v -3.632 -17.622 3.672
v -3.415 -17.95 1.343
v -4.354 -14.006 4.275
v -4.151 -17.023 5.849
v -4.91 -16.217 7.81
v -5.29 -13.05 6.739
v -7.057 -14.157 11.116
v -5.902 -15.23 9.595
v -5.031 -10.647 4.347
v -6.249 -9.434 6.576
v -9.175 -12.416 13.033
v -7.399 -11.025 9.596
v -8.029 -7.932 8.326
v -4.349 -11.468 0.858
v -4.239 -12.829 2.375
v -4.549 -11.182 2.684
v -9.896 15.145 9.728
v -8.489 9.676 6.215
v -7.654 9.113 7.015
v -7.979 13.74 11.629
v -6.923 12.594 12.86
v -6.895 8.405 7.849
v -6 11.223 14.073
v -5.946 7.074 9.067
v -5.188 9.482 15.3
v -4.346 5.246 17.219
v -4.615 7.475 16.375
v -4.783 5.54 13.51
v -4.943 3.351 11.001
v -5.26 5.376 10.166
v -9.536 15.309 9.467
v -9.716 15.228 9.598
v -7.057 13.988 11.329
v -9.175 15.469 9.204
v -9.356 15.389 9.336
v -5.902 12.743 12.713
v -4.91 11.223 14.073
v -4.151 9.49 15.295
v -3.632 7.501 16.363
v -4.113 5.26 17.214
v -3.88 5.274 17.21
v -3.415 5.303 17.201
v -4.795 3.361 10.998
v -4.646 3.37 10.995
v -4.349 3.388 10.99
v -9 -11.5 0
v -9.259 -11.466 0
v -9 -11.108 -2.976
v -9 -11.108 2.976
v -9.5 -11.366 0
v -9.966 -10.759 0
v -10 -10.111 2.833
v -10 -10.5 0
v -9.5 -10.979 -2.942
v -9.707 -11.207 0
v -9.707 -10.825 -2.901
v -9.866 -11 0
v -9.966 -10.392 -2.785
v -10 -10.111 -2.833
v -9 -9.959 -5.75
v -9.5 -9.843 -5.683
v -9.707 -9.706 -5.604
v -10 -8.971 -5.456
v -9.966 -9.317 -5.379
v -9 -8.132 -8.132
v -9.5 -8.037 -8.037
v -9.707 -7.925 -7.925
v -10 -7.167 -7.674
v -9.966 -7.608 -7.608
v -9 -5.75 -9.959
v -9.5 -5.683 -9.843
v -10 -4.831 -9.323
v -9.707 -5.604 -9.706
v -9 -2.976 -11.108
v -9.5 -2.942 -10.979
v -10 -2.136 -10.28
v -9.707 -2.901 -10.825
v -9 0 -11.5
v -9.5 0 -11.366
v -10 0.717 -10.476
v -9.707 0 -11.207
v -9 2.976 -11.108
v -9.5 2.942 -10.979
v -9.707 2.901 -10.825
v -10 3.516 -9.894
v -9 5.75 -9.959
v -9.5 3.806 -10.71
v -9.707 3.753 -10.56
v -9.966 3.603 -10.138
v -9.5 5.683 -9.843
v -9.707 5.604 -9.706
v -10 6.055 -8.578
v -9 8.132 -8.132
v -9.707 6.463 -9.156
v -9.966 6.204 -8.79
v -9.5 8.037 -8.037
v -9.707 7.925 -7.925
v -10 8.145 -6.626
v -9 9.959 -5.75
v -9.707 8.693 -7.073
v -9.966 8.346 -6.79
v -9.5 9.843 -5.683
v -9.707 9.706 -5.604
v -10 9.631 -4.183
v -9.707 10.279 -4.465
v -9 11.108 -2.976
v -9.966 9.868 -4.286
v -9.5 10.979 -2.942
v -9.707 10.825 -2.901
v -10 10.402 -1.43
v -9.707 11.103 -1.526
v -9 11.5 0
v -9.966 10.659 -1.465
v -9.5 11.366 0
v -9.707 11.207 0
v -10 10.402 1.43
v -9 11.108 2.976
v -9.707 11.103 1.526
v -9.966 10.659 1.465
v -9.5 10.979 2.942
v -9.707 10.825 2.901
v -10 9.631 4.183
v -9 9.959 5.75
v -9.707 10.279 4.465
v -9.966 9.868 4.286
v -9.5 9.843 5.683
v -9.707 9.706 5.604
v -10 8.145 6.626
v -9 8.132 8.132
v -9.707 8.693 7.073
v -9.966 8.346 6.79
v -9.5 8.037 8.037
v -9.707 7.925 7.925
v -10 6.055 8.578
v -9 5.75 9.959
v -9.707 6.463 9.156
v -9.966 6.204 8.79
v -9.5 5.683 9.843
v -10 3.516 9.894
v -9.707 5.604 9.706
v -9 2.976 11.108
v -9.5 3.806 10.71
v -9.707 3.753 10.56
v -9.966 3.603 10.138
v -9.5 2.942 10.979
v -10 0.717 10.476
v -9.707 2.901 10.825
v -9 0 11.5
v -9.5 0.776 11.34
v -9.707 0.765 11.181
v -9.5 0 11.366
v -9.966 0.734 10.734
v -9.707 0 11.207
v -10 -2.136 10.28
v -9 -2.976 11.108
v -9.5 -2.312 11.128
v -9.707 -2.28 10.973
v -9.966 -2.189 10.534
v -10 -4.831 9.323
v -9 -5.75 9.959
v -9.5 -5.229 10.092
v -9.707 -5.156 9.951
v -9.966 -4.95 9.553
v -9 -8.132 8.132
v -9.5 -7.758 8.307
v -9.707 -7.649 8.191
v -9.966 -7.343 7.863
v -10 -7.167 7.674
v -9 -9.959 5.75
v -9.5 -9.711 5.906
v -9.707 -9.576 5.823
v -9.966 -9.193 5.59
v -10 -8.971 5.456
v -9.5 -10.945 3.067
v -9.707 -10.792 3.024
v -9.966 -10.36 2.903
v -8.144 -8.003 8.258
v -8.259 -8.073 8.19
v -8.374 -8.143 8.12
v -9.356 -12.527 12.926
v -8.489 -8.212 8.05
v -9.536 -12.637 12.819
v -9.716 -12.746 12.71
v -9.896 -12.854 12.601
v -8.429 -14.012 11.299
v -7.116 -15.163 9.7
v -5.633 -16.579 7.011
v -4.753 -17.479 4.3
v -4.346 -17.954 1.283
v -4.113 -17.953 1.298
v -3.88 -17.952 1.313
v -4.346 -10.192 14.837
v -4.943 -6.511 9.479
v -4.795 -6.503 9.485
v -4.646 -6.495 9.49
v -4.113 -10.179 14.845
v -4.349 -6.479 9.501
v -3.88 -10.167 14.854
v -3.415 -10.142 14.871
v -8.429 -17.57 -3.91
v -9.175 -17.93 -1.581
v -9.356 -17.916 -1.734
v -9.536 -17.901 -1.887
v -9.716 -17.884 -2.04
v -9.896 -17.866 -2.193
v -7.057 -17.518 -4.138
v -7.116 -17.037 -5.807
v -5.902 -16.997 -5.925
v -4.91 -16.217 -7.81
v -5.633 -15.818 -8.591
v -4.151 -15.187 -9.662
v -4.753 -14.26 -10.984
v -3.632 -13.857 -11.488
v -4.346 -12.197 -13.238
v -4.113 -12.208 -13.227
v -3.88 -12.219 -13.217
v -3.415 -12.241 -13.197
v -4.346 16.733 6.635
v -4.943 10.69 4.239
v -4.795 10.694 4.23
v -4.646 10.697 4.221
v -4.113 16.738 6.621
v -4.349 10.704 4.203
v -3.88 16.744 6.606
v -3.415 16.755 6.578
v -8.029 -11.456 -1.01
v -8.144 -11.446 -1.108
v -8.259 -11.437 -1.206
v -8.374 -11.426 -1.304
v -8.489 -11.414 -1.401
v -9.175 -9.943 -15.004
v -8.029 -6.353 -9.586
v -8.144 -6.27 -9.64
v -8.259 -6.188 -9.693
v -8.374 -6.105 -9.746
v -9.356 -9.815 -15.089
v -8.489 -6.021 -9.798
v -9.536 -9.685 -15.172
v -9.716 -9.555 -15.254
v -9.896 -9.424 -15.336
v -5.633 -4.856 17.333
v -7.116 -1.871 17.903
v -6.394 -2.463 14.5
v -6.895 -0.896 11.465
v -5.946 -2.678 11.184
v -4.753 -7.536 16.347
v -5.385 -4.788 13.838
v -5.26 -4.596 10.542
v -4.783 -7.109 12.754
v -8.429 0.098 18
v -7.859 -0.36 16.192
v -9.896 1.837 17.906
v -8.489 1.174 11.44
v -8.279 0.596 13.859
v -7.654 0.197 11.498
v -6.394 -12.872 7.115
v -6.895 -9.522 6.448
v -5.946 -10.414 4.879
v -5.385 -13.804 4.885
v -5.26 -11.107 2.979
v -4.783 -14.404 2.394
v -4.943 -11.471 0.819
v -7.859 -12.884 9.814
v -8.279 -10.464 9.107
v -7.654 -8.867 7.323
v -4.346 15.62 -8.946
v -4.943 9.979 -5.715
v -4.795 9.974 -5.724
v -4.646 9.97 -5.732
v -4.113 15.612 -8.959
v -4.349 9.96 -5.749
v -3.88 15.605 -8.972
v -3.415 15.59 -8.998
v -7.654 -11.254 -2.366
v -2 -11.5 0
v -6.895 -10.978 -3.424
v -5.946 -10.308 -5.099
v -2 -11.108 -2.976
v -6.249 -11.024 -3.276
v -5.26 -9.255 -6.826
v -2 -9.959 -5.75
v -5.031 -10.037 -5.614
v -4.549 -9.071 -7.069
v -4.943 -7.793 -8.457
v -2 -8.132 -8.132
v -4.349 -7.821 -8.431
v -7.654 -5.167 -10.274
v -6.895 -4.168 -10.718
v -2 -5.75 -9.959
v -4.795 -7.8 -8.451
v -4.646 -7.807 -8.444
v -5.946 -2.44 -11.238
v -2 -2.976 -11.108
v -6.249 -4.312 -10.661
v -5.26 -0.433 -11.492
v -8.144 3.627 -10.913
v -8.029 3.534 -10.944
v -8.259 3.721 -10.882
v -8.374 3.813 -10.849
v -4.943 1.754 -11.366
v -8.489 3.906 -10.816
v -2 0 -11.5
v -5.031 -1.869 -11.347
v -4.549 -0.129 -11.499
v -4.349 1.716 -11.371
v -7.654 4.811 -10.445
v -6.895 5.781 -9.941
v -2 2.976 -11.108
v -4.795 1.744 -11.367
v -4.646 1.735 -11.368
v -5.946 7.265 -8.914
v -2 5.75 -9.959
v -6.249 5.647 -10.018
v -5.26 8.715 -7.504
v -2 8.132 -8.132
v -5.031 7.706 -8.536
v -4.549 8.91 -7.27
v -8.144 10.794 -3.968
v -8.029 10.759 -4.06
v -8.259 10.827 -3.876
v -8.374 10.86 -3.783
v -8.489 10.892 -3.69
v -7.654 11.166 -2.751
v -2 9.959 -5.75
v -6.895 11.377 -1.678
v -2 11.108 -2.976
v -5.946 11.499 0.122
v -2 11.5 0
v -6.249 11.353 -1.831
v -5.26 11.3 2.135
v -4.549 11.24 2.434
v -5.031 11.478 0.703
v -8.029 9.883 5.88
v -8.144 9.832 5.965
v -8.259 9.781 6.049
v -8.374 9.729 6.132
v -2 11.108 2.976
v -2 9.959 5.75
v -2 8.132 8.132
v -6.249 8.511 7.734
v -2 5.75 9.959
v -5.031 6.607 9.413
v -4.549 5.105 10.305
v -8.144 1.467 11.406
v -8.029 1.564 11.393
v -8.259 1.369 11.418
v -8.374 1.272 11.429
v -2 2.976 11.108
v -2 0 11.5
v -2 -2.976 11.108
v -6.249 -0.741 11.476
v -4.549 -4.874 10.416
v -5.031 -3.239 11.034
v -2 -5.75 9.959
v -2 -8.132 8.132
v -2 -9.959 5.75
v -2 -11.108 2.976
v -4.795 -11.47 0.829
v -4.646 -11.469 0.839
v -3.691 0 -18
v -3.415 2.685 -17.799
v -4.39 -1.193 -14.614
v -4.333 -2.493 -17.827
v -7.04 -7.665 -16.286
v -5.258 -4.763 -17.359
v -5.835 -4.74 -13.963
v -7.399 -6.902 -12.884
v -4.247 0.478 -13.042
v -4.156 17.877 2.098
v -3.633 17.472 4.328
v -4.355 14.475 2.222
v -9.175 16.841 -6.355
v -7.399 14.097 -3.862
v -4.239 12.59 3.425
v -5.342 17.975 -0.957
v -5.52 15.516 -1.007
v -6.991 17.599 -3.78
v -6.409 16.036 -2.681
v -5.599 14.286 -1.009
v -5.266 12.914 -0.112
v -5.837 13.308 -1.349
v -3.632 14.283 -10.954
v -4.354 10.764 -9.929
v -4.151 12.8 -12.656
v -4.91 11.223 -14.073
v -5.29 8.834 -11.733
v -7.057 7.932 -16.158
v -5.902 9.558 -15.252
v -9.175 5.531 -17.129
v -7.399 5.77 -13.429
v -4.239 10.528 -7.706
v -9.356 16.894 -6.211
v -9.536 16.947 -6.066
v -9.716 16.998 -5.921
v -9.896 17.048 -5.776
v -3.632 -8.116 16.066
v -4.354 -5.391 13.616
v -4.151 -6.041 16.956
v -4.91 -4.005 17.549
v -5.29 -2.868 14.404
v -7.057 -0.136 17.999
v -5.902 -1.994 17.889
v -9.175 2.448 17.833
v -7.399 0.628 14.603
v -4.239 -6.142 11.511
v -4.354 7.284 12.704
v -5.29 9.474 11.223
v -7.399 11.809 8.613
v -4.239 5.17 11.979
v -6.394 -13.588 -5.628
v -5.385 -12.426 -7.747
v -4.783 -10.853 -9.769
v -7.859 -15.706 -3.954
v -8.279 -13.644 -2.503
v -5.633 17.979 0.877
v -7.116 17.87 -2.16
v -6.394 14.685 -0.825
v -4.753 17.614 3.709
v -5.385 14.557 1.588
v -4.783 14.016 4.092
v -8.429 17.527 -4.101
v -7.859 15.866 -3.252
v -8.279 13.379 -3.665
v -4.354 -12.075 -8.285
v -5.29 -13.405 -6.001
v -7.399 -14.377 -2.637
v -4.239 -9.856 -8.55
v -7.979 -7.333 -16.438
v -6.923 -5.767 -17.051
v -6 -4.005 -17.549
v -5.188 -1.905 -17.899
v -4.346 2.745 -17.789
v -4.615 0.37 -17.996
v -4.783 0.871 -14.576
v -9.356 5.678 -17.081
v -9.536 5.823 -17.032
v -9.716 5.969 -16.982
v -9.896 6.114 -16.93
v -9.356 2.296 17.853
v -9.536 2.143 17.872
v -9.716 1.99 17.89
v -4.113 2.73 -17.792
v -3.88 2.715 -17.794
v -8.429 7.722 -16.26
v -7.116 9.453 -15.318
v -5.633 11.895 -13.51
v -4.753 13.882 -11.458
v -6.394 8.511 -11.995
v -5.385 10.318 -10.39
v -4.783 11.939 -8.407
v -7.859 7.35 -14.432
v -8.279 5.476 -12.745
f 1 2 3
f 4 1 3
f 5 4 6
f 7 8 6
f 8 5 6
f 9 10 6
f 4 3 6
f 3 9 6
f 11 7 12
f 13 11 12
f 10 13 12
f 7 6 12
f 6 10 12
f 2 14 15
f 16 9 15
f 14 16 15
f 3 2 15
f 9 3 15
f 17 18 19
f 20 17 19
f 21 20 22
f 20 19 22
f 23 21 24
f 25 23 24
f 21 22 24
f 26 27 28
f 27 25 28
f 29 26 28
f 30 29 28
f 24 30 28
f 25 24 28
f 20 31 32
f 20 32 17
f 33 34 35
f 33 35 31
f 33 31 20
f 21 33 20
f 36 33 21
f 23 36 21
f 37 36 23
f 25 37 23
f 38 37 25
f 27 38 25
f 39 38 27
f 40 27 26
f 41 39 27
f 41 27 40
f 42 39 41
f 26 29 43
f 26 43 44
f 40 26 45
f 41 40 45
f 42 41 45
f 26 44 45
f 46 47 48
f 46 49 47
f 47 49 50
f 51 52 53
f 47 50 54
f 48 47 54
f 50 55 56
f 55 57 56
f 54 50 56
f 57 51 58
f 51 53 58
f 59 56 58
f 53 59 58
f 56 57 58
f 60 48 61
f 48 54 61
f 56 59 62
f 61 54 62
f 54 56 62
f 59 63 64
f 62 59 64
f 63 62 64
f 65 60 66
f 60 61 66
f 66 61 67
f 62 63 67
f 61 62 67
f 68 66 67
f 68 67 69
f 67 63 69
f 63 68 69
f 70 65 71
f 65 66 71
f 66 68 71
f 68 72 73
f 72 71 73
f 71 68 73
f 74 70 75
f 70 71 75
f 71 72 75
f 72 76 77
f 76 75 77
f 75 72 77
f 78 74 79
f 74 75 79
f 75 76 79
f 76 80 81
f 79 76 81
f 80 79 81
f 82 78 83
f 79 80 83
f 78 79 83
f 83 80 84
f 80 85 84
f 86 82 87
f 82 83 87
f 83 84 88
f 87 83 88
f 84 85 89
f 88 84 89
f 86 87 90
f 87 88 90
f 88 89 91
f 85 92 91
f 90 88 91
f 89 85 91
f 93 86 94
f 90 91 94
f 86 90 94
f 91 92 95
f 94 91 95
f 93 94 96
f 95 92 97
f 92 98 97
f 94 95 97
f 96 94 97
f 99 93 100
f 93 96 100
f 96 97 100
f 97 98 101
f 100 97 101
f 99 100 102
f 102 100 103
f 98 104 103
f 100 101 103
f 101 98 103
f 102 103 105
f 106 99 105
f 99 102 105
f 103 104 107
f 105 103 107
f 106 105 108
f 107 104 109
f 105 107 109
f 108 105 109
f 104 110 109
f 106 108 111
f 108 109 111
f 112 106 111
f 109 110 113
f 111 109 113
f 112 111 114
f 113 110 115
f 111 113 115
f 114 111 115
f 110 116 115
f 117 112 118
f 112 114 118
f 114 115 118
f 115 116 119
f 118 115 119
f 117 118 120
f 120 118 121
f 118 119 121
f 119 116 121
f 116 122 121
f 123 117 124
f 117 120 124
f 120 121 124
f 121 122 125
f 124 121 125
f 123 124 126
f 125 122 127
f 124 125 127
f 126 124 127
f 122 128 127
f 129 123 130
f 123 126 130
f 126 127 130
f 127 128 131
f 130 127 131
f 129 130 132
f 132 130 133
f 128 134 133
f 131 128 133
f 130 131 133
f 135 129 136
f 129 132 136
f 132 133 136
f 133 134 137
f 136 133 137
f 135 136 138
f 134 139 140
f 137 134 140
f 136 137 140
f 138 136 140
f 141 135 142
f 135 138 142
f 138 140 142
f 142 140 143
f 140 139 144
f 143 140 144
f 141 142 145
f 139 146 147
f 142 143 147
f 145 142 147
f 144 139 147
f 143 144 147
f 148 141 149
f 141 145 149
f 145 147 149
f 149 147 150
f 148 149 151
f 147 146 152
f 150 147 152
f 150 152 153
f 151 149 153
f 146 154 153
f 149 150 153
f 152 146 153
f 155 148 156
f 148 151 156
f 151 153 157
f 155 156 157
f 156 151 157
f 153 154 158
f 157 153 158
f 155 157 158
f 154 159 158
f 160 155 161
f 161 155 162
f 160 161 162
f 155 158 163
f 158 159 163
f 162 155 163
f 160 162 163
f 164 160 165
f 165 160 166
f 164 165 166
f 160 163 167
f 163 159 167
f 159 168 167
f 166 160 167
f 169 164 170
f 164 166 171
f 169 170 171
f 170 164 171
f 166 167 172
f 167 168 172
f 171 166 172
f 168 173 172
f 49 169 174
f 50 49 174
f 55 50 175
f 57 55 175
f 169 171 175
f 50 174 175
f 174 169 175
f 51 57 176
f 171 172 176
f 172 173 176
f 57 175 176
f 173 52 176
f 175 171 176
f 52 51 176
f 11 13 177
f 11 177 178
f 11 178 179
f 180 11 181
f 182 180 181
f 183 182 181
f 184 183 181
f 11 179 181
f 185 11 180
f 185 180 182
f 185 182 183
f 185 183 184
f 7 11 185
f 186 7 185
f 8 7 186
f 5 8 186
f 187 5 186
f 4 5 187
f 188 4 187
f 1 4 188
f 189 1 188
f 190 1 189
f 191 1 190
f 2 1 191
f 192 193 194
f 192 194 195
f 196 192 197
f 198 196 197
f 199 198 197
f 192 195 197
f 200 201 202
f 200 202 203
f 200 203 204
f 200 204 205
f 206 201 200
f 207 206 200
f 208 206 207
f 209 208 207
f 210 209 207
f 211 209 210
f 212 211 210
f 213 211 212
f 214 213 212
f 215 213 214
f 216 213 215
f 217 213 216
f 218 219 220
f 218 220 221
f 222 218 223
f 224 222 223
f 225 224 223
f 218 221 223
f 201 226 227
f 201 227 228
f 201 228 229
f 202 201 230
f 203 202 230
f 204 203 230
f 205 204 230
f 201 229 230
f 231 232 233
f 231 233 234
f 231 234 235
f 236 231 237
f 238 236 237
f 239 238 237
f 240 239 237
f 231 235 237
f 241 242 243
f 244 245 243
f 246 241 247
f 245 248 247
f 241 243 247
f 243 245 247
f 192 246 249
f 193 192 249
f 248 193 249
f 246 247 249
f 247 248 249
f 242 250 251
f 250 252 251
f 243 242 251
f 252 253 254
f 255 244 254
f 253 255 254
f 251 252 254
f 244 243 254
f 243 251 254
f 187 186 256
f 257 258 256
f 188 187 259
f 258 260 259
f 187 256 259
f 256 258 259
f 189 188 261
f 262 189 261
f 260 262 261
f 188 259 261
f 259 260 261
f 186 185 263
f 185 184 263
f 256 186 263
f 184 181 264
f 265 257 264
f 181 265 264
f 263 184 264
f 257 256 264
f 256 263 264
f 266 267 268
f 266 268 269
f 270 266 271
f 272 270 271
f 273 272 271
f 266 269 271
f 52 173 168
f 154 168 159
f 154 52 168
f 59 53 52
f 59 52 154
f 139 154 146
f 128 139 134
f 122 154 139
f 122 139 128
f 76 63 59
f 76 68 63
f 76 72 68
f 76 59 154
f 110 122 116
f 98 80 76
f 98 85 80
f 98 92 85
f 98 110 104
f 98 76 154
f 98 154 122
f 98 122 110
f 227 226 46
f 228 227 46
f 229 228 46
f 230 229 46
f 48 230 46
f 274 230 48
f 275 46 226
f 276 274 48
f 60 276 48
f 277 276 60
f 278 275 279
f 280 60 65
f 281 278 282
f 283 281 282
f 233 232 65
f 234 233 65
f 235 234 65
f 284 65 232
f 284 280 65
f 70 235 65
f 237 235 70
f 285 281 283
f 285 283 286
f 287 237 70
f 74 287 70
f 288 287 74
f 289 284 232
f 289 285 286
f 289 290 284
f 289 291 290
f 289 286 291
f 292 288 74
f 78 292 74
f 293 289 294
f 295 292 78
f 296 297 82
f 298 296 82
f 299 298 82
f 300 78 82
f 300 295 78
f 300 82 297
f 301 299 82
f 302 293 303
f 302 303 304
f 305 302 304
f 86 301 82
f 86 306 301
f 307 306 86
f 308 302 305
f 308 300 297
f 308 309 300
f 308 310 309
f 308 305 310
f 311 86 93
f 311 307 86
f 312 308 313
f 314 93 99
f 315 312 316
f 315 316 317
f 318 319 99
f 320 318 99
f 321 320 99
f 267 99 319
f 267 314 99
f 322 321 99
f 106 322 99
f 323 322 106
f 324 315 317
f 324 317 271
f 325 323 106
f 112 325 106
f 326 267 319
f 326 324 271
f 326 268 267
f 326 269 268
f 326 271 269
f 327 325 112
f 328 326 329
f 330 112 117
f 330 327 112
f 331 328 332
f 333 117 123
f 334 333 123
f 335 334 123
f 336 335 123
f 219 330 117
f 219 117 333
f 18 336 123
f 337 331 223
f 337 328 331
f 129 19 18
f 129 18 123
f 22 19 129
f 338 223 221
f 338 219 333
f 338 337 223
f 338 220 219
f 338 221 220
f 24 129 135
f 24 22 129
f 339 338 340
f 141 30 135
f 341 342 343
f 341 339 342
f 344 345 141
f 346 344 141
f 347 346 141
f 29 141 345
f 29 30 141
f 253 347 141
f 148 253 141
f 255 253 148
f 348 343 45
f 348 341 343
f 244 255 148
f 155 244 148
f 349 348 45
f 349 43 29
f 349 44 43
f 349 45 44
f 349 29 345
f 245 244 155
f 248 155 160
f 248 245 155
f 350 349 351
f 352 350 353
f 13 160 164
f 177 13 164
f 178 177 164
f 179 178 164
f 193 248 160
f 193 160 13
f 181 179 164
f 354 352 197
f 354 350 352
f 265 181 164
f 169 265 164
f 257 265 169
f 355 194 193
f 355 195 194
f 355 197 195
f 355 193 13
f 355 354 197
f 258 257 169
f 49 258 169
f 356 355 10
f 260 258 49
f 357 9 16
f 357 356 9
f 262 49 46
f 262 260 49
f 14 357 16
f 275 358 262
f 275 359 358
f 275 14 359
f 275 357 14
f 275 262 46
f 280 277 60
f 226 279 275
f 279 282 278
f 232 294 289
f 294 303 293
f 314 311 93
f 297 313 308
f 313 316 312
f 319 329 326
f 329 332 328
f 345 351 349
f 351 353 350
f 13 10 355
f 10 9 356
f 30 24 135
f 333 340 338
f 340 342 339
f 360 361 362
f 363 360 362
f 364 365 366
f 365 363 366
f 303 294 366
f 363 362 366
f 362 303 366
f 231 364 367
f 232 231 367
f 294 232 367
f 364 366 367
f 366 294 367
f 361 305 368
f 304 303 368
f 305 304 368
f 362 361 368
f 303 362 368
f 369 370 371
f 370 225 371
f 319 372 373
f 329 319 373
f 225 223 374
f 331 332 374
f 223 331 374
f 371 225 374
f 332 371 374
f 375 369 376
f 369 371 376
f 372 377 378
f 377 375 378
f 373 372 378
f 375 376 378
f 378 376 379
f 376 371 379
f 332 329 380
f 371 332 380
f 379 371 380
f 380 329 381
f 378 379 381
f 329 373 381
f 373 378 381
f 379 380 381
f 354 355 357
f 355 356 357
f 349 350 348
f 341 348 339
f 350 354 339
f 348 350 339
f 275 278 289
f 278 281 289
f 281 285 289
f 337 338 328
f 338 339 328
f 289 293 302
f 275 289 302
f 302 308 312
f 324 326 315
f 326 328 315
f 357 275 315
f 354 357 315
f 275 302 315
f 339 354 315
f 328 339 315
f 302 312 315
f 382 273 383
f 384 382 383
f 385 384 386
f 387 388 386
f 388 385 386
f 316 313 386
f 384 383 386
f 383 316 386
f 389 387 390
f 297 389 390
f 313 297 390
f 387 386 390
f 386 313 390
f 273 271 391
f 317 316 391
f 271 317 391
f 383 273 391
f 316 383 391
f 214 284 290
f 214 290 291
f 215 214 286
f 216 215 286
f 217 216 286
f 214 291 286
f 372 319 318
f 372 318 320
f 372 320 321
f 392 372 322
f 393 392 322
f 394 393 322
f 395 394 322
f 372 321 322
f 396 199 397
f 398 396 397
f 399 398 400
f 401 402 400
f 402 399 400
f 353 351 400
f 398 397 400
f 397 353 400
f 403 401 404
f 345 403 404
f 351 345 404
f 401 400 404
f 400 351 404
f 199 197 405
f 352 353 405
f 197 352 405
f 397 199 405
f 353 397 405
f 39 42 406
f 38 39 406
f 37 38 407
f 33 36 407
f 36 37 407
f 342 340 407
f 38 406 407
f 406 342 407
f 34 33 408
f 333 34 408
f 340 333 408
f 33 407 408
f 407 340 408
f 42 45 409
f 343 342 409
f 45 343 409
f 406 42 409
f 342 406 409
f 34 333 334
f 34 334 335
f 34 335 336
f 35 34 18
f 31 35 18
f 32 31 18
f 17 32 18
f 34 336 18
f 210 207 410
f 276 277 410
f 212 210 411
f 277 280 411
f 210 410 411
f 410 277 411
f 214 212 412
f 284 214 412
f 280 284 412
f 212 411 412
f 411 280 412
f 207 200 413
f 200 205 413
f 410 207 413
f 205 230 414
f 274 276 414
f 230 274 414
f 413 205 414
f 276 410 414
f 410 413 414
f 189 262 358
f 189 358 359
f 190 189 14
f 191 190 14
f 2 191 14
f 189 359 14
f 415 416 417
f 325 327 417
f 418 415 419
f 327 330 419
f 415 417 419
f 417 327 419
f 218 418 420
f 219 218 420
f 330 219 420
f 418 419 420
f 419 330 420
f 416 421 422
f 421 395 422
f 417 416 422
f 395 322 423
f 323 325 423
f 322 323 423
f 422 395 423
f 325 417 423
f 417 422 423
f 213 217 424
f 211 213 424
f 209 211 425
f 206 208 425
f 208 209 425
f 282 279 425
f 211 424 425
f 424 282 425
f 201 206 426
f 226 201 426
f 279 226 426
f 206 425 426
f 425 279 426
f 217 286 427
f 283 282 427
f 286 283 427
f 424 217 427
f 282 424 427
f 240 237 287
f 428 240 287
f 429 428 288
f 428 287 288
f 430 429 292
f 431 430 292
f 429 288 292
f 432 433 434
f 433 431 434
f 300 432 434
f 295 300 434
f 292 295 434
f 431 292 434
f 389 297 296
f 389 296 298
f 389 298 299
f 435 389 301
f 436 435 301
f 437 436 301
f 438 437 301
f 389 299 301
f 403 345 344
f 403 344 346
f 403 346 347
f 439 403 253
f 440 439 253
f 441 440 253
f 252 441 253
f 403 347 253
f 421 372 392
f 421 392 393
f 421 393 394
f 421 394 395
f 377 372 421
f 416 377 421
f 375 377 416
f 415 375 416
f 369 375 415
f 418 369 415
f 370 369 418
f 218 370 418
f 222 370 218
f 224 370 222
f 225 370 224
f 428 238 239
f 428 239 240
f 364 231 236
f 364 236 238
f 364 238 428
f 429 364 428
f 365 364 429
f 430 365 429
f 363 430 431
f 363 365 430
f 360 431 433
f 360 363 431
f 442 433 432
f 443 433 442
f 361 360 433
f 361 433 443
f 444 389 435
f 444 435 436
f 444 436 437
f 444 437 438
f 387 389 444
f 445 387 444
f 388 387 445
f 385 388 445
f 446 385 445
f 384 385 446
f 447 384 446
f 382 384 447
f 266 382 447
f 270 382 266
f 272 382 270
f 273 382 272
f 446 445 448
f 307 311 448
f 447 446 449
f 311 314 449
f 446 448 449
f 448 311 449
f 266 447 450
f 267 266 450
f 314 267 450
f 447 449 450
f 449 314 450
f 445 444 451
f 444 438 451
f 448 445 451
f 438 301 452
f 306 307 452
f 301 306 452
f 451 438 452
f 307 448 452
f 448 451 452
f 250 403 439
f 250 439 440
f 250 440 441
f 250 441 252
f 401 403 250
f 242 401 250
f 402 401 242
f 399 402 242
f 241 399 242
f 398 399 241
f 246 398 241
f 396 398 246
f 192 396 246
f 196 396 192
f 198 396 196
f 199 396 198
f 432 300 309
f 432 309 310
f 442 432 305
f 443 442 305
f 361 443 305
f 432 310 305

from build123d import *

# Parameters (mm, degrees)
SKETCH5_W                  = 8
SKETCH5_H                  = 11.5
CIRPATTERN1_COUNT          = 7
SKETCH_CUT_BLADE_OUTSIDE_W = 50.999
SKETCH_CUT_BLADE_OUTSIDE_H = 50.116
SKETCH_CUT_BLADE_OUTSIDE_R = 18
CUT_FAN_BLADE_DEPTH        = 30.009117079
COSMETIC_FILLET_R          = 1


with BuildPart() as part:
    # Sketch5 → Body (revolve)
    with BuildSketch(Plane.XY, mode=Mode.PRIVATE) as body_sk:
        with Locations((-6, 5.75)):
            Rectangle(SKETCH5_W, SKETCH5_H)
    revolve(body_sk.sketch.rotate(Axis((-10, 0, 0), (1, 0, 0)), 180), axis=Axis((-10, 0, 0), (1, 0, 0)))

    # Sketch-Blade-Top → Loft-Fan-Blade section 0
    with BuildSketch(Plane(origin=(0, 18, 0), x_dir=(-1, 0, 0), z_dir=(0, 1, 0)), mode=Mode.PRIVATE) as loft_fan_blade_s0:
        with BuildLine():
            Line((4.220534784, 7.137045162), (3.222970733, 7.067288688))
            ThreePointArc((3.222970733, 7.067288688), (5.086454542, -0.406736643), (9.393823742, -6.792674095))
            Line((9.393823742, -6.792674095), (10.113163542, -6.098015725))
            ThreePointArc((10.113163542, -6.098015725), (6, 0), (4.220534784, 7.137045162))
        make_face()
    loft_fan_blade = loft([loft_fan_blade_s0.sketch, Vertex(-6, 0, 0)])

    # CirPattern1: Loft-Fan-Blade ×7 about axis
    cirpattern1_axis = Axis((-10, 0, 0), (1, 0, 0))
    for i in range(1, CIRPATTERN1_COUNT):
        add(loft_fan_blade.rotate(cirpattern1_axis, i * 360 / CIRPATTERN1_COUNT))

    # Sketch-Cut-Blade outside → Cut-Fan-Blade (cut, through all)
    with BuildSketch(Plane(origin=(0, 0, 0), x_dir=(0, 0, -1), z_dir=(1, 0, 0))):
        with Locations((0.0385, -0.657)):
            Rectangle(SKETCH_CUT_BLADE_OUTSIDE_W, SKETCH_CUT_BLADE_OUTSIDE_H)
        Circle(SKETCH_CUT_BLADE_OUTSIDE_R, mode=Mode.SUBTRACT)
    extrude(amount=-CUT_FAN_BLADE_DEPTH, mode=Mode.SUBTRACT)

    # Cosmetic-Fillet
    cosmetic_fillet_edges = [part.edges().sort_by_distance(p)[0] for p in [
        (-10, 11.5, 0),
    ]]
    fillet(cosmetic_fillet_edges, radius=COSMETIC_FILLET_R)


solid = part.part
